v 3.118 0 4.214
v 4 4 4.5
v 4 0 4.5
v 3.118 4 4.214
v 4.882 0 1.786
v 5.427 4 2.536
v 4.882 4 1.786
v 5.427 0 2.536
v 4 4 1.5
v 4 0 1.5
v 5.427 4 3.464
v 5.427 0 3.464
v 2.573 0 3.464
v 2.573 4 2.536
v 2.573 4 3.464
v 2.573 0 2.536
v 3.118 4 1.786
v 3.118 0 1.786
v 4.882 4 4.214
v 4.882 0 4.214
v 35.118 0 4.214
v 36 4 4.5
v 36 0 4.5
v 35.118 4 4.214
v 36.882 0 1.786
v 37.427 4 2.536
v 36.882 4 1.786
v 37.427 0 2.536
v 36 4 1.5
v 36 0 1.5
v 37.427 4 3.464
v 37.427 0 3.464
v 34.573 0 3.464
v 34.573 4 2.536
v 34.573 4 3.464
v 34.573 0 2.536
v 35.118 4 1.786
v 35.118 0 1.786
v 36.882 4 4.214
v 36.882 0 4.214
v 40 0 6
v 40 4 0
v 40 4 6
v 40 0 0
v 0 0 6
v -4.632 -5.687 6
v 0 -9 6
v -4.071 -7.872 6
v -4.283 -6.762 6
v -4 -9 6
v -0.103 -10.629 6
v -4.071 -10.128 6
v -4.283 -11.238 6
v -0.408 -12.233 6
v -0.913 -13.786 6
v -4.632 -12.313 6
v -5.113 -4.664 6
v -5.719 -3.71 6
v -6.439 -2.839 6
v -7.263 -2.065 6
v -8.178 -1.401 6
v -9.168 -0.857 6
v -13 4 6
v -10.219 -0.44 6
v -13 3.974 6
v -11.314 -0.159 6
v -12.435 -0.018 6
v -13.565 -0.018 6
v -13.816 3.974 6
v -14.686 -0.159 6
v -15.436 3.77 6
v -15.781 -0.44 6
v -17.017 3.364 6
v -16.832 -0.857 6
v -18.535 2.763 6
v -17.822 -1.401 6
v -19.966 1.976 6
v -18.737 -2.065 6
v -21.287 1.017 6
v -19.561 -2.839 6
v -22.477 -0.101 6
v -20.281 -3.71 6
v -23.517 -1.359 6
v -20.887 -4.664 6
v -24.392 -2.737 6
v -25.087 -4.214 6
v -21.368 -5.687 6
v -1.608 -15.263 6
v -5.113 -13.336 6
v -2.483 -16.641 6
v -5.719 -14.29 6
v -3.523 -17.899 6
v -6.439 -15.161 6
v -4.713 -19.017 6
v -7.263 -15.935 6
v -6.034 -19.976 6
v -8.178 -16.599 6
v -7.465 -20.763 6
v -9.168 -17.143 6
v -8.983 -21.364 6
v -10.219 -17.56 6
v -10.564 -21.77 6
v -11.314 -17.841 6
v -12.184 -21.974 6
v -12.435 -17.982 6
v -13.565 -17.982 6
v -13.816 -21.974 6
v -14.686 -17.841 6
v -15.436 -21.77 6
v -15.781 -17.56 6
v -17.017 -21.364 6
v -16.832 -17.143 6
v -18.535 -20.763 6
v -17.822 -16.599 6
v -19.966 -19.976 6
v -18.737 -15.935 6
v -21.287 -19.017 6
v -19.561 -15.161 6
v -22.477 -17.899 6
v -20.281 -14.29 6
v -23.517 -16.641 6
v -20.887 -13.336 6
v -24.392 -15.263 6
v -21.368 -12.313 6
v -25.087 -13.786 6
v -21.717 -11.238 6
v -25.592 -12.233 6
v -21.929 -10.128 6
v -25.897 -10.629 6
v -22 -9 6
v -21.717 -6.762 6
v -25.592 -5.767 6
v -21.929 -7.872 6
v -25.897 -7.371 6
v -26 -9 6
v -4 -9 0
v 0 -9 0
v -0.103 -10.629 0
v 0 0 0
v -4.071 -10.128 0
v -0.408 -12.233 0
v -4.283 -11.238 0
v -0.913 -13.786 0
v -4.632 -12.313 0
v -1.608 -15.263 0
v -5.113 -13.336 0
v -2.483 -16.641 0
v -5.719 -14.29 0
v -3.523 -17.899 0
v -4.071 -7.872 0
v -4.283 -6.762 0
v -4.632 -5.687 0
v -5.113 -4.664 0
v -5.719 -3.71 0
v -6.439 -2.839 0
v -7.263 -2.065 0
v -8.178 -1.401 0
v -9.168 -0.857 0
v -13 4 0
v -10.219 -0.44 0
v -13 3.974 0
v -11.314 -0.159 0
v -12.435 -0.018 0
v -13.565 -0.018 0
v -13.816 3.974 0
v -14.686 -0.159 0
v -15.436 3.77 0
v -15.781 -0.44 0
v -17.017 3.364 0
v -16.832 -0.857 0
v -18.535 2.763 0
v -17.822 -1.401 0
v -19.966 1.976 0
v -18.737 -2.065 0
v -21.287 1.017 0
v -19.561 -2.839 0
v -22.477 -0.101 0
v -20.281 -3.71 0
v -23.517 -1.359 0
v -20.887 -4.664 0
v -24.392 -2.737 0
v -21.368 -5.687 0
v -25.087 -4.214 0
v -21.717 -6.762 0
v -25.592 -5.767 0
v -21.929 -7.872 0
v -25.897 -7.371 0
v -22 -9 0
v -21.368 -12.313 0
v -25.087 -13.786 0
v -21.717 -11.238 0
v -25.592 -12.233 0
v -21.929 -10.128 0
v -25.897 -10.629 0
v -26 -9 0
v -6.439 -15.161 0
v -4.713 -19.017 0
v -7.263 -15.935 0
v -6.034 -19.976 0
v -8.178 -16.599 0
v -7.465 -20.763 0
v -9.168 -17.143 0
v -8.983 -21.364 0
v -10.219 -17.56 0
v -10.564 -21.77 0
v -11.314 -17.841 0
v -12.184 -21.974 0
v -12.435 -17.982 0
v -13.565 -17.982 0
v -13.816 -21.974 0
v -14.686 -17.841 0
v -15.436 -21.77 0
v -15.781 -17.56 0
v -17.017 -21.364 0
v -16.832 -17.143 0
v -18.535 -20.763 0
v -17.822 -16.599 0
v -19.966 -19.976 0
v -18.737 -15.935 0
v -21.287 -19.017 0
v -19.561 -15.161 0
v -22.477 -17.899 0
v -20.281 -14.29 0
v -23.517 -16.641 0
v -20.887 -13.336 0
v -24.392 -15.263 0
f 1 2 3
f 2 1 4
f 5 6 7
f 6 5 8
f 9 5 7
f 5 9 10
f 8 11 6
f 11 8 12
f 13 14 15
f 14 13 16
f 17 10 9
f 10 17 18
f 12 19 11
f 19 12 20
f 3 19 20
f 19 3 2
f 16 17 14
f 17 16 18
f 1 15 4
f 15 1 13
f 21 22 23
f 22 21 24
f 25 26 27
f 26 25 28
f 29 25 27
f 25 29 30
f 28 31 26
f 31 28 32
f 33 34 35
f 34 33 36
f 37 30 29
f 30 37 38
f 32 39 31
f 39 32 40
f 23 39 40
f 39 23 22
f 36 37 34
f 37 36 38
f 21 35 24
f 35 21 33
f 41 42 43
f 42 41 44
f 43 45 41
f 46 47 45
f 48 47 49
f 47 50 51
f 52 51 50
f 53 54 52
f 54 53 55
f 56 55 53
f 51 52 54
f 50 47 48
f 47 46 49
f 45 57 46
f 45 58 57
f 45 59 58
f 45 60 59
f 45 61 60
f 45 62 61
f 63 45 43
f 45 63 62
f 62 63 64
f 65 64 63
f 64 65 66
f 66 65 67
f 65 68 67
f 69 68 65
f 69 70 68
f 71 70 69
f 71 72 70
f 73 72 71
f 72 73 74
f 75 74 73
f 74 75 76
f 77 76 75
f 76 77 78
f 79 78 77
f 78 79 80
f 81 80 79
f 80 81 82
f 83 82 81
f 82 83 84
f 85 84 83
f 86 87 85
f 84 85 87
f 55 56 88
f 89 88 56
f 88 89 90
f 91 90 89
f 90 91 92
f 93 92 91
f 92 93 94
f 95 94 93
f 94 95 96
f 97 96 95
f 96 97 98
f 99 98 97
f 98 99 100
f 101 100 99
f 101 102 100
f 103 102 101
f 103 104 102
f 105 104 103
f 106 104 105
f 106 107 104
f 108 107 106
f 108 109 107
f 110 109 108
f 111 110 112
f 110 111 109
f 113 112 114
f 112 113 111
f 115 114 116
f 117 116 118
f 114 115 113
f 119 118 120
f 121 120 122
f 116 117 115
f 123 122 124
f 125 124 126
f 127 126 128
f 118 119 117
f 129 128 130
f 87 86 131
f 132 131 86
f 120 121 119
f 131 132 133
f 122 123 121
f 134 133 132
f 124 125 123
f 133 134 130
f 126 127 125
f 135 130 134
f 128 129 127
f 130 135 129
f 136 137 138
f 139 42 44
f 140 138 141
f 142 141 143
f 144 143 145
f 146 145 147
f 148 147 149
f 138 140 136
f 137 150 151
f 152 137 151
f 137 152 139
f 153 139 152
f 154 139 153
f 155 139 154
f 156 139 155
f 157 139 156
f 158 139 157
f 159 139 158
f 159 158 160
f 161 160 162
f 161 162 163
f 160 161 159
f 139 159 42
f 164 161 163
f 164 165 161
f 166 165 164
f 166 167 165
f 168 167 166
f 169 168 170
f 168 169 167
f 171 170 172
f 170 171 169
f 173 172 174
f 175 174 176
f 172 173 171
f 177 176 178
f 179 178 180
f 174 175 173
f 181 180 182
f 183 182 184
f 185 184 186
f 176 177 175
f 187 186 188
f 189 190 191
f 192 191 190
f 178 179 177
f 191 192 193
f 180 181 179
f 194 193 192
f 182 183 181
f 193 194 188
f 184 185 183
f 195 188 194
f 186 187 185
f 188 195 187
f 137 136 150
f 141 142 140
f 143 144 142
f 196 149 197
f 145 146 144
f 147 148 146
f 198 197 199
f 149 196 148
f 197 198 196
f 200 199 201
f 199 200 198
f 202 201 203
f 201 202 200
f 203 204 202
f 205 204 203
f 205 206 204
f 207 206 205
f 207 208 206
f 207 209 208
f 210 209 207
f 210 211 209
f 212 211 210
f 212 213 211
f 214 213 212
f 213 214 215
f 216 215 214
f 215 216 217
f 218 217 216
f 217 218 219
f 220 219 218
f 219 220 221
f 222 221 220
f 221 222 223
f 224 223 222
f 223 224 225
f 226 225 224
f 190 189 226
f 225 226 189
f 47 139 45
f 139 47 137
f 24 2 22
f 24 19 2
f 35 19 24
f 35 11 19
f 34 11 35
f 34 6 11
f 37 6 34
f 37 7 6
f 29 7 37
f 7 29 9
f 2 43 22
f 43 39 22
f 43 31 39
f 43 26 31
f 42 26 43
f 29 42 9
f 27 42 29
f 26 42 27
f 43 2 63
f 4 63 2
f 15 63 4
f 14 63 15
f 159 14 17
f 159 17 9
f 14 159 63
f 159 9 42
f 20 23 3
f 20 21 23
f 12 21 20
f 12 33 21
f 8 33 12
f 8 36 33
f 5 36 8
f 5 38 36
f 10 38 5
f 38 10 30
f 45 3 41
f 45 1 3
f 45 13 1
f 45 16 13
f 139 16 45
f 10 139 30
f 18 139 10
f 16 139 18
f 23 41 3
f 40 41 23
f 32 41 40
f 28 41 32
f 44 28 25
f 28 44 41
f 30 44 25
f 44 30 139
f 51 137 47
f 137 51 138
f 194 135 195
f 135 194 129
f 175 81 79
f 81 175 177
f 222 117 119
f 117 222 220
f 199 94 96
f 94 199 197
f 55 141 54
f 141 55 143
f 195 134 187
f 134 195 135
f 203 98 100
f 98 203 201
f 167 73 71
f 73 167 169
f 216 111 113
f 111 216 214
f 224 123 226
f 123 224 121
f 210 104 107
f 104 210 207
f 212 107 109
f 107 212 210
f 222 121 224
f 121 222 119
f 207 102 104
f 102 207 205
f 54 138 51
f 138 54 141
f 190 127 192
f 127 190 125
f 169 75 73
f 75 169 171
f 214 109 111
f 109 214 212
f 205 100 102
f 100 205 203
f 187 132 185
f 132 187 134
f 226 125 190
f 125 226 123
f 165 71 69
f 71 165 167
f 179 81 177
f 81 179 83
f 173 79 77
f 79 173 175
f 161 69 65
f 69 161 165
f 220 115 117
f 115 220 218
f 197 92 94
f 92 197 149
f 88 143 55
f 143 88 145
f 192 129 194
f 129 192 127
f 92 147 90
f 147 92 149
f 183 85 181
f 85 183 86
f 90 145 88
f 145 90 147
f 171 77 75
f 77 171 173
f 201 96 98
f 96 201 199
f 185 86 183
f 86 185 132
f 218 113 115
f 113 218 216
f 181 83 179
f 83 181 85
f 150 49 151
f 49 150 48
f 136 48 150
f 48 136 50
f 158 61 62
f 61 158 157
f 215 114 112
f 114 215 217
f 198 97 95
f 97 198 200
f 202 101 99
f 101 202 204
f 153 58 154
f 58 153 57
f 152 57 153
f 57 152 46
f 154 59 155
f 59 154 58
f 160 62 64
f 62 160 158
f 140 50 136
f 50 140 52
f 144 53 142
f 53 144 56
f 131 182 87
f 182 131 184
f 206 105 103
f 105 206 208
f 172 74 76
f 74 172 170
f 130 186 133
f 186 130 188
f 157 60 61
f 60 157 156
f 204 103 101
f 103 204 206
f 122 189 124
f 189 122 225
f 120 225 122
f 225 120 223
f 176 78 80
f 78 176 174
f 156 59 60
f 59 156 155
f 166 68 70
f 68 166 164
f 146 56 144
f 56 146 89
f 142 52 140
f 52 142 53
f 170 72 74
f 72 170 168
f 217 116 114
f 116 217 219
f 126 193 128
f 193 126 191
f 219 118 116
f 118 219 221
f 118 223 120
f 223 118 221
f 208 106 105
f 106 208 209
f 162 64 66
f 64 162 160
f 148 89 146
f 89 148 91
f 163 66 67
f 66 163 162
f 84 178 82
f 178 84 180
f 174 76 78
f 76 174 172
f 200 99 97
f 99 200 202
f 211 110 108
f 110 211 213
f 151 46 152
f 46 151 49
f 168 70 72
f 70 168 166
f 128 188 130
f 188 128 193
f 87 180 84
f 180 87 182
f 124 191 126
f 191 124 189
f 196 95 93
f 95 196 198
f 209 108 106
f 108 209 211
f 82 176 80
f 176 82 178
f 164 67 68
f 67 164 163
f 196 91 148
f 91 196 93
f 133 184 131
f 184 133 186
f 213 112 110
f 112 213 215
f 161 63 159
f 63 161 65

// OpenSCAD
module sensor(sensor_diameter, thickness, height)
{
    difference() {
        cylinder(d=sensor_diameter + 2*thickness, h=height, $fn=50);
        sensor_hole(sensor_diameter, height);
    }
}

module sensor_hole(sensor_diameter, height) {
    translate([0, 0, -height/2]) cylinder(d=sensor_diameter, h=height+height, $fn=50);
}

module fan_mount(fan_width, screw_diameter, screw_distance, thickness, height) {
    difference() {
        cube([fan_width, thickness, height]);
        rotate([0, 90, -90]) {
            translate([-height/2, screw_distance, -thickness*1.5]) cylinder(d=screw_diameter, h=thickness+thickness, $fn=10);
            translate([-height/2, fan_width-screw_distance, -thickness*1.5]) cylinder(d=screw_diameter, h=thickness+thickness, $fn=10);
        }
    }
}

module mount(sensor_diameter, fan_width, screw_diameter, screw_distance, thickness, height) {
    fan_mount(fan_width, screw_diameter, screw_distance, thickness, height);
    
    sd2 = (sensor_diameter/2);
    t2 = (thickness/2);
    translate([-(sd2+t2+t2), -(sd2), 0]) sensor(sensor_diameter, thickness, height);
    // Piece that connects fan mount to sensor holder
    difference() {
        translate([-(sd2+t2+t2), -(sd2), 0]) cube([sd2+t2+t2, sd2+t2+t2, height]);
        translate([-(sd2+t2+t2), -(sd2), 0]) sensor_hole(sensor_diameter, height);
    }
}

mount(18, 40, 3, 4, 4, 6);
